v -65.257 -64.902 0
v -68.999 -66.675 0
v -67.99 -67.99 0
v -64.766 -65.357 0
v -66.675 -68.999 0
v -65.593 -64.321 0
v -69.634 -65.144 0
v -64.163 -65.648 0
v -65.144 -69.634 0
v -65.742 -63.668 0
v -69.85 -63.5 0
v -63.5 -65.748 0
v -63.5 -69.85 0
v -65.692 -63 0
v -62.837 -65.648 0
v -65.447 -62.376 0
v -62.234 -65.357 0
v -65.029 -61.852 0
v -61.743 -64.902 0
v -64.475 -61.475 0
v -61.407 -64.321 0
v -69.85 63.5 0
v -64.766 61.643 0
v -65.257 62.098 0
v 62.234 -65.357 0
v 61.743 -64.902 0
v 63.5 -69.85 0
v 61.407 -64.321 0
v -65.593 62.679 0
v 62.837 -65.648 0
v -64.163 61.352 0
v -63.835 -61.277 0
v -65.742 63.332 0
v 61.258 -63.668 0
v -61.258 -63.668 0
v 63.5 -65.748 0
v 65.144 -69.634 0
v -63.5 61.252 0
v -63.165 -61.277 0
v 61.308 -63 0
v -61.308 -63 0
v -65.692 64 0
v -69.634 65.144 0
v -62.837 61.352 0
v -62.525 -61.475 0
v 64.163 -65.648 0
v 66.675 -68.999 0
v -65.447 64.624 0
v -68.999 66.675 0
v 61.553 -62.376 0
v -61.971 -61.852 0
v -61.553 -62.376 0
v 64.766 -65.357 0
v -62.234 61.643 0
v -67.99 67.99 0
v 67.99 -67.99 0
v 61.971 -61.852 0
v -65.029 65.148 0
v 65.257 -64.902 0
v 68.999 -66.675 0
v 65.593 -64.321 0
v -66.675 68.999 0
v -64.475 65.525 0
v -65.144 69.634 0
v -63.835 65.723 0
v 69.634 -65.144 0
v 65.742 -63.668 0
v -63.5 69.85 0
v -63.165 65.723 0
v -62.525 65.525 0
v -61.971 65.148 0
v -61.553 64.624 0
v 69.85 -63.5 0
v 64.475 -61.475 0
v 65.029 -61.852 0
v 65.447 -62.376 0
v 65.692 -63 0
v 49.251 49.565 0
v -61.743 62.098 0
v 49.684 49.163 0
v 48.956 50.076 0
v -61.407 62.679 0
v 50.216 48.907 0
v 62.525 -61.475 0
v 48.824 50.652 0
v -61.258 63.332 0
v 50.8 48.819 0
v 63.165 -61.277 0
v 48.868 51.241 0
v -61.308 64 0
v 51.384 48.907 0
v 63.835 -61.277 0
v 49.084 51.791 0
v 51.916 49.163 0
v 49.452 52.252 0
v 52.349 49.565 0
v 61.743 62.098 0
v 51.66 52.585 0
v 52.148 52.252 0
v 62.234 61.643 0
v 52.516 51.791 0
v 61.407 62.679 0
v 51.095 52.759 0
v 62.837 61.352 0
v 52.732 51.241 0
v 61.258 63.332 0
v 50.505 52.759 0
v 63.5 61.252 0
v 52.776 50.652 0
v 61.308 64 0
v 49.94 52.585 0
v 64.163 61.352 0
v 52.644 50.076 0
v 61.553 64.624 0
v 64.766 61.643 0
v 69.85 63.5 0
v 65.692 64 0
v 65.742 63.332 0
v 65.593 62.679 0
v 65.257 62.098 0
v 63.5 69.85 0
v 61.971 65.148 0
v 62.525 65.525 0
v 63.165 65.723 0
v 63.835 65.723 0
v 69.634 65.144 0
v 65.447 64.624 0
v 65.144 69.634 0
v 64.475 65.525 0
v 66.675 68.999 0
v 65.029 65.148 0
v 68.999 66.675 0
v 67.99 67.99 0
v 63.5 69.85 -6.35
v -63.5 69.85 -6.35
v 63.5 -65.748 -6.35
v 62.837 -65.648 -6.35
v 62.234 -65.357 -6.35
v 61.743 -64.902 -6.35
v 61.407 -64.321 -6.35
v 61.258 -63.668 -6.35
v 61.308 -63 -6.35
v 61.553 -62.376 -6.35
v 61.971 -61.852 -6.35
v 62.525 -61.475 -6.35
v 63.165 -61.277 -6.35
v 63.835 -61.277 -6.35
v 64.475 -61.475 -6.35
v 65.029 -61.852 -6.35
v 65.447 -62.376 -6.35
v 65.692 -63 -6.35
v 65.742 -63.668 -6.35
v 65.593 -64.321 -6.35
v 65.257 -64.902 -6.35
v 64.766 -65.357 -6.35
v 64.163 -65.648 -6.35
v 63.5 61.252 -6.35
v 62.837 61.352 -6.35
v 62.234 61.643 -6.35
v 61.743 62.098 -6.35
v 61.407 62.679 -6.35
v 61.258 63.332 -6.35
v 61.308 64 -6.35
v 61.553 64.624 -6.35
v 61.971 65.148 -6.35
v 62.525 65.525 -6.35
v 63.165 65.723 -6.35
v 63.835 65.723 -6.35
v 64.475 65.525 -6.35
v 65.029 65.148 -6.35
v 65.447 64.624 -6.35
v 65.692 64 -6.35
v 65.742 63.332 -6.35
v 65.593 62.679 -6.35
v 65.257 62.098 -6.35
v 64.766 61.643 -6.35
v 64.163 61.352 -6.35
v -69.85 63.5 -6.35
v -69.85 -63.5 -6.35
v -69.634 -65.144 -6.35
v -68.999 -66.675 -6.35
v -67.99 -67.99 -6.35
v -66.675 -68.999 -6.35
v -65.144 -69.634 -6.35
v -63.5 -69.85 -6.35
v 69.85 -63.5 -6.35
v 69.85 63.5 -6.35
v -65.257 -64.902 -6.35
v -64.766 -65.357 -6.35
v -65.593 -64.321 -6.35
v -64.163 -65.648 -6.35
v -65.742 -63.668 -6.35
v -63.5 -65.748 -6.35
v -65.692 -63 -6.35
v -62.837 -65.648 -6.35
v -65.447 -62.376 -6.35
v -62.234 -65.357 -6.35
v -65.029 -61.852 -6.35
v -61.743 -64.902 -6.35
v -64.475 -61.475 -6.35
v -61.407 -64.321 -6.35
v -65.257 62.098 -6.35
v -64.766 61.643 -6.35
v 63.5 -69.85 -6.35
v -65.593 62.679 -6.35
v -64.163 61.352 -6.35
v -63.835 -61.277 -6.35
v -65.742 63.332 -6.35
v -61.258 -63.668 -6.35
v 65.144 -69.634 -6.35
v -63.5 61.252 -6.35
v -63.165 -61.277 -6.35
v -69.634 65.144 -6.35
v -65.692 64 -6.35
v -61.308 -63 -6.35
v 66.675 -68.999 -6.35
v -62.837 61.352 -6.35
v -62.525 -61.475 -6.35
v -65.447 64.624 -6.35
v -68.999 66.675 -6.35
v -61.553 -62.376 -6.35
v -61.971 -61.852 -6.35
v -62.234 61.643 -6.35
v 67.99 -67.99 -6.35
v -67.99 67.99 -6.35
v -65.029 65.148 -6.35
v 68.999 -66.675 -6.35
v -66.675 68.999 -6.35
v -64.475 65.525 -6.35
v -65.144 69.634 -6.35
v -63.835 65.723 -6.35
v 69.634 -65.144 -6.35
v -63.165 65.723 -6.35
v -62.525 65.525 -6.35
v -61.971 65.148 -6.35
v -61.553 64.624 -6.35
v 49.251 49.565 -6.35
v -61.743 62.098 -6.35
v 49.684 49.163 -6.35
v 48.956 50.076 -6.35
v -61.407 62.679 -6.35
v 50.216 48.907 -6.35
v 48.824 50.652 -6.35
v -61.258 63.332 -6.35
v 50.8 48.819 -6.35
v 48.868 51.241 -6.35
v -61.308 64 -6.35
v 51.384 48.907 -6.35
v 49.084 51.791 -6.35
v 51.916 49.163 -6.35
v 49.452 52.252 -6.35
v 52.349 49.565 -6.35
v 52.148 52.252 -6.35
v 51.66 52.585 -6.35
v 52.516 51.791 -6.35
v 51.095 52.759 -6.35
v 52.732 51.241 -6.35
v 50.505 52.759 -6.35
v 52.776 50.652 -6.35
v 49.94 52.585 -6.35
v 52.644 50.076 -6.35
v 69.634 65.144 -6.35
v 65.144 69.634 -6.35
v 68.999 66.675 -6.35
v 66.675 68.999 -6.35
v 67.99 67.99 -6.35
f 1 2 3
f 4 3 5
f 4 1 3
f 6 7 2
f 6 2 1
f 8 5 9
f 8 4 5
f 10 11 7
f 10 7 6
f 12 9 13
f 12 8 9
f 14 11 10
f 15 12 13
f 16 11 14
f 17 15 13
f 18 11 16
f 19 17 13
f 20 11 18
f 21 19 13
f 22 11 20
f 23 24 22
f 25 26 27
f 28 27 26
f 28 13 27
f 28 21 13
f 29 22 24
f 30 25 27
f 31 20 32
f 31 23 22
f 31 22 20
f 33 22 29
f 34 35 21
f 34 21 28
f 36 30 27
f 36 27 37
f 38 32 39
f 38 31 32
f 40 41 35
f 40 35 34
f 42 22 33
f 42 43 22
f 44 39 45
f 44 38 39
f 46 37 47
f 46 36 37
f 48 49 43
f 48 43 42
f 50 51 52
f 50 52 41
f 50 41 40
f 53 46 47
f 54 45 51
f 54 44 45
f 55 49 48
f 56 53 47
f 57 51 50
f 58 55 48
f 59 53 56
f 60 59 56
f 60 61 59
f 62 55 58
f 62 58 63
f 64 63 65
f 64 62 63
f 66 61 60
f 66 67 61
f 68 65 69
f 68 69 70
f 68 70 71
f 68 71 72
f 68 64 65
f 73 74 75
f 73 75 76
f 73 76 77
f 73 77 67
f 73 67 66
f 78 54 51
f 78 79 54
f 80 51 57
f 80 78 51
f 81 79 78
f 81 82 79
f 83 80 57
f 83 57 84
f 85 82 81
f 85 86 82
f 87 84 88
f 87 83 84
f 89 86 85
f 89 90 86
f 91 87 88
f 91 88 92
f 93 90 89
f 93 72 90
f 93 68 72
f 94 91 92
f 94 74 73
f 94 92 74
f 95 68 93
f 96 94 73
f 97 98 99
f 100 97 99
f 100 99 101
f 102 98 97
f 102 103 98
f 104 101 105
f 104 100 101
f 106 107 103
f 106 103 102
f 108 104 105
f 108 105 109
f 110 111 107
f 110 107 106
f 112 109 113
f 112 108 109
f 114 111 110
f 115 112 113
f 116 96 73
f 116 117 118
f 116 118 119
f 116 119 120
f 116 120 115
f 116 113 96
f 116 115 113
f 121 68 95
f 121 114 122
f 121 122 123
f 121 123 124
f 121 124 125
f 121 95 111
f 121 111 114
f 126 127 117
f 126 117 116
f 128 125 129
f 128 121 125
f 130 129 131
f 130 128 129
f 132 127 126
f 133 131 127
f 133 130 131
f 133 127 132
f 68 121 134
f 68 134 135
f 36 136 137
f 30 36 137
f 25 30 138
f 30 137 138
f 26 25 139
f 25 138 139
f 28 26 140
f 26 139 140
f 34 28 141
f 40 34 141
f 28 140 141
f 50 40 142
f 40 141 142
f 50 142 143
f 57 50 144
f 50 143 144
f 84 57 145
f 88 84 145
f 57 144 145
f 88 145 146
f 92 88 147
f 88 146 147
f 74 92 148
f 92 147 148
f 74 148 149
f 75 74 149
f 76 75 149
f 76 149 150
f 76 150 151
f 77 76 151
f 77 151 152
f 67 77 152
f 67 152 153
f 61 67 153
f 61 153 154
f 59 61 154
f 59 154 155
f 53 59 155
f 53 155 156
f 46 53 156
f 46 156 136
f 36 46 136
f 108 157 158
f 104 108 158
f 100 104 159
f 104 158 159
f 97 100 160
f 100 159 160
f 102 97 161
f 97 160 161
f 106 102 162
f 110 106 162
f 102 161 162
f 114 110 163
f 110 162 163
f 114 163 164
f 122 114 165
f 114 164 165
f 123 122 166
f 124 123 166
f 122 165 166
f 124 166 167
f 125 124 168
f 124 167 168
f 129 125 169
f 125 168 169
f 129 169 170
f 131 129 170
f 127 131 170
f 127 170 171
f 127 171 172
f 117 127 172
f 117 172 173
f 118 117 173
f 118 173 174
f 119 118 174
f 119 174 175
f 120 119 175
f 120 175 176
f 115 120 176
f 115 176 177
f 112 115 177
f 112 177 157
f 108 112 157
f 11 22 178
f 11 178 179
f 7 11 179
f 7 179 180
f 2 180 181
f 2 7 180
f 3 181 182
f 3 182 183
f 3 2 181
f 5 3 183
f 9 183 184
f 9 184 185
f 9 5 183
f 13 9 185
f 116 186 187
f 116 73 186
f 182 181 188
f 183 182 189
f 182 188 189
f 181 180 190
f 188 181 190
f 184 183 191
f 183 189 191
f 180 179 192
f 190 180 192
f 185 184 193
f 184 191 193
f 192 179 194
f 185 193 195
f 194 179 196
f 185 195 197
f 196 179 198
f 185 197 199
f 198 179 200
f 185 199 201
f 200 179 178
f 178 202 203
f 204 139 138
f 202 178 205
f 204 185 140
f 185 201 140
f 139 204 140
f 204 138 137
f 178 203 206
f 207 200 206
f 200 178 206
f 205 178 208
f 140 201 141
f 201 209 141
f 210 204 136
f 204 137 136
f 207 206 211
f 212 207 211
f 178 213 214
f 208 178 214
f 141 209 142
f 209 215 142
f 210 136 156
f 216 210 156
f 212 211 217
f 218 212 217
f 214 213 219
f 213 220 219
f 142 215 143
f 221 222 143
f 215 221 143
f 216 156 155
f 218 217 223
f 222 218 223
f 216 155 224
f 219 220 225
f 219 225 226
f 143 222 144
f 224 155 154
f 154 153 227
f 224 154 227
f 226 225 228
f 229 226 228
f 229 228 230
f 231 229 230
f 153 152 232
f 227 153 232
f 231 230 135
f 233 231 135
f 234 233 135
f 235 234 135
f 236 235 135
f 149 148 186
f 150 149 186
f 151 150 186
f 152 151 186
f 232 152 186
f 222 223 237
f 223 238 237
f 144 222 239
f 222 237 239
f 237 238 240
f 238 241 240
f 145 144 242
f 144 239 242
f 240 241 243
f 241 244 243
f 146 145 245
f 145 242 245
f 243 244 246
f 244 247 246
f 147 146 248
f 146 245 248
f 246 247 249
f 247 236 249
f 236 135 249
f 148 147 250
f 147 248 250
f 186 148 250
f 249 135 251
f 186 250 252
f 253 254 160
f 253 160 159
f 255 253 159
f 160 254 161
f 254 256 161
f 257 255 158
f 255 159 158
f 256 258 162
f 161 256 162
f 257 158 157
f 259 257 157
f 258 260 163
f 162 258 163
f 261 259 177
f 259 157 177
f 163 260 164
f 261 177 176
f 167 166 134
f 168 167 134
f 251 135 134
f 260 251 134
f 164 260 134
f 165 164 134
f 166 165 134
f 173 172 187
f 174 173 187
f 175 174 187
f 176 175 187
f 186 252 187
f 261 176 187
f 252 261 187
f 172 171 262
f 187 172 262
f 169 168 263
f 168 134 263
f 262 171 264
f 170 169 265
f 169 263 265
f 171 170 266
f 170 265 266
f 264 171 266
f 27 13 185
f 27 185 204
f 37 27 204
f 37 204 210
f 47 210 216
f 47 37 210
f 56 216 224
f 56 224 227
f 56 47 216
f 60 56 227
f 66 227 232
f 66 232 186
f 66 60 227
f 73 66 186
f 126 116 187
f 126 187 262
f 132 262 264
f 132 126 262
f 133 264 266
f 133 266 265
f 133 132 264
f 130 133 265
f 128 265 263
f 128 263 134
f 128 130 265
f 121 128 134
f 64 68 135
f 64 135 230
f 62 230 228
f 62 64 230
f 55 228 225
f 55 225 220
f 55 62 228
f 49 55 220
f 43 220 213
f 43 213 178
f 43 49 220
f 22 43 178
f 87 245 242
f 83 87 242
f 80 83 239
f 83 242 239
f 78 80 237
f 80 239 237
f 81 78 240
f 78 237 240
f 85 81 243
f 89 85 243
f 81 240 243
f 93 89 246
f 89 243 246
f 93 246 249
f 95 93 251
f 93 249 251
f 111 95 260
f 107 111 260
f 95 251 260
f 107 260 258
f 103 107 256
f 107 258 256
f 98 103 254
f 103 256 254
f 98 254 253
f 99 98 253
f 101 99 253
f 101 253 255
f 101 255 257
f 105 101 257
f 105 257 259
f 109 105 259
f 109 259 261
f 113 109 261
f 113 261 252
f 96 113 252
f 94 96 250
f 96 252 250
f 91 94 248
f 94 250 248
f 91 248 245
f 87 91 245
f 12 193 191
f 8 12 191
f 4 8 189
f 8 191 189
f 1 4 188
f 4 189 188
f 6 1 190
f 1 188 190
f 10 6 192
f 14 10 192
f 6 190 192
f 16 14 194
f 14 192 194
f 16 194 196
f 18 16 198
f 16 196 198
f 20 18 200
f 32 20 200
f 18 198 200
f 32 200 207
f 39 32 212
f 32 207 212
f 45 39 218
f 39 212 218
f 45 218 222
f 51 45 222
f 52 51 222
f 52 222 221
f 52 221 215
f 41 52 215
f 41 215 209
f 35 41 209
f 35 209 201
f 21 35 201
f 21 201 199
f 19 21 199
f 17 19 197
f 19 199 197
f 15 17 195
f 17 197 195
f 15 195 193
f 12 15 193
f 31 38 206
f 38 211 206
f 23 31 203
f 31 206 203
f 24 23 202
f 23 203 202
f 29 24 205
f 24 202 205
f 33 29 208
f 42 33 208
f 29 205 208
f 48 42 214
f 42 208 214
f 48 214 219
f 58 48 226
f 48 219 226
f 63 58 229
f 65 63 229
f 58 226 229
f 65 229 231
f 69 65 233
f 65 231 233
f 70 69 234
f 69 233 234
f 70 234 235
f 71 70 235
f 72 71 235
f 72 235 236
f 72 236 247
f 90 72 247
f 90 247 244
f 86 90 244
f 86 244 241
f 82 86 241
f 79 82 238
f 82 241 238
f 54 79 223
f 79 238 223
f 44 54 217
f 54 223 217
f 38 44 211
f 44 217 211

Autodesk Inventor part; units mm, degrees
ref_plane "YZ Plane" through (0, 0, 0) normal (1, 0, 0) x (0, 1, 0)
ref_plane "XZ Plane" through (0, 0, 0) normal (0, 1, 0) x (-1, 0, 0)
ref_plane "XY Plane" through (0, 0, 0) normal (0, 0, 1) x (1, 0, 0)
sketch "Sketch1" plane through (0, 0, 0) normal (0, 0, 1) x (1, 0, 0)
  line L0 (-63.5, -69.85) -> (63.5, -69.85)
  line L1 (69.85, -63.5) -> (69.85, 63.5)
  line L2 (63.5, 69.85) -> (-63.5, 69.85)
  line L3 (-69.85, 63.5) -> (-69.85, -63.5)
  arc A0 (-63.5, 69.85) -> (-69.85, 63.5) centre (-63.5, 63.5) ccw
  arc A1 (69.85, 63.5) -> (63.5, 69.85) centre (63.5, 63.5) ccw
  arc A2 (63.5, -69.85) -> (69.85, -63.5) centre (63.5, -63.5) ccw
  arc A3 (-69.85, -63.5) -> (-63.5, -69.85) centre (-63.5, -63.5) ccw
  point P0 (0, 0)
  point P1 (69.85, 0)
  point P2 (0, 69.85)
  point P3 (50.8, 50.8)
  dimension "d0" = 139.7
  dimension "d1" = 139.7
  dimension "d2" = 6.35
  dimension "d3" = 19.05
  dimension "d4" = 19.05
extrude "Extrusion1" add sketch "Sketch1" against normal blind 6.35
hole "Hole1" at (-63.5, 63.5, 0) at (63.5, 63.5, 0) at (63.5, -63.5, 0) at (-63.5, -63.5, 0) direction (0, 0, -1) diameter 4.4958 end through all clearance for "Flat Head Machine Screw (82)" size "#8" standard "Ansi Unified Screw Threads"
hole "Hole2" at (50.8, 50.8, 0) direction (0, 0, -1) diameter 3.9624 end through all thread size "10-32 UNF" class "2B" standard "ANSI Unified Screw Threads"
equation "\"d1\" = d0"
equation "\"d4\" = d3"
properties part number "J007954" material "ACRYLIC, CLEAR"
